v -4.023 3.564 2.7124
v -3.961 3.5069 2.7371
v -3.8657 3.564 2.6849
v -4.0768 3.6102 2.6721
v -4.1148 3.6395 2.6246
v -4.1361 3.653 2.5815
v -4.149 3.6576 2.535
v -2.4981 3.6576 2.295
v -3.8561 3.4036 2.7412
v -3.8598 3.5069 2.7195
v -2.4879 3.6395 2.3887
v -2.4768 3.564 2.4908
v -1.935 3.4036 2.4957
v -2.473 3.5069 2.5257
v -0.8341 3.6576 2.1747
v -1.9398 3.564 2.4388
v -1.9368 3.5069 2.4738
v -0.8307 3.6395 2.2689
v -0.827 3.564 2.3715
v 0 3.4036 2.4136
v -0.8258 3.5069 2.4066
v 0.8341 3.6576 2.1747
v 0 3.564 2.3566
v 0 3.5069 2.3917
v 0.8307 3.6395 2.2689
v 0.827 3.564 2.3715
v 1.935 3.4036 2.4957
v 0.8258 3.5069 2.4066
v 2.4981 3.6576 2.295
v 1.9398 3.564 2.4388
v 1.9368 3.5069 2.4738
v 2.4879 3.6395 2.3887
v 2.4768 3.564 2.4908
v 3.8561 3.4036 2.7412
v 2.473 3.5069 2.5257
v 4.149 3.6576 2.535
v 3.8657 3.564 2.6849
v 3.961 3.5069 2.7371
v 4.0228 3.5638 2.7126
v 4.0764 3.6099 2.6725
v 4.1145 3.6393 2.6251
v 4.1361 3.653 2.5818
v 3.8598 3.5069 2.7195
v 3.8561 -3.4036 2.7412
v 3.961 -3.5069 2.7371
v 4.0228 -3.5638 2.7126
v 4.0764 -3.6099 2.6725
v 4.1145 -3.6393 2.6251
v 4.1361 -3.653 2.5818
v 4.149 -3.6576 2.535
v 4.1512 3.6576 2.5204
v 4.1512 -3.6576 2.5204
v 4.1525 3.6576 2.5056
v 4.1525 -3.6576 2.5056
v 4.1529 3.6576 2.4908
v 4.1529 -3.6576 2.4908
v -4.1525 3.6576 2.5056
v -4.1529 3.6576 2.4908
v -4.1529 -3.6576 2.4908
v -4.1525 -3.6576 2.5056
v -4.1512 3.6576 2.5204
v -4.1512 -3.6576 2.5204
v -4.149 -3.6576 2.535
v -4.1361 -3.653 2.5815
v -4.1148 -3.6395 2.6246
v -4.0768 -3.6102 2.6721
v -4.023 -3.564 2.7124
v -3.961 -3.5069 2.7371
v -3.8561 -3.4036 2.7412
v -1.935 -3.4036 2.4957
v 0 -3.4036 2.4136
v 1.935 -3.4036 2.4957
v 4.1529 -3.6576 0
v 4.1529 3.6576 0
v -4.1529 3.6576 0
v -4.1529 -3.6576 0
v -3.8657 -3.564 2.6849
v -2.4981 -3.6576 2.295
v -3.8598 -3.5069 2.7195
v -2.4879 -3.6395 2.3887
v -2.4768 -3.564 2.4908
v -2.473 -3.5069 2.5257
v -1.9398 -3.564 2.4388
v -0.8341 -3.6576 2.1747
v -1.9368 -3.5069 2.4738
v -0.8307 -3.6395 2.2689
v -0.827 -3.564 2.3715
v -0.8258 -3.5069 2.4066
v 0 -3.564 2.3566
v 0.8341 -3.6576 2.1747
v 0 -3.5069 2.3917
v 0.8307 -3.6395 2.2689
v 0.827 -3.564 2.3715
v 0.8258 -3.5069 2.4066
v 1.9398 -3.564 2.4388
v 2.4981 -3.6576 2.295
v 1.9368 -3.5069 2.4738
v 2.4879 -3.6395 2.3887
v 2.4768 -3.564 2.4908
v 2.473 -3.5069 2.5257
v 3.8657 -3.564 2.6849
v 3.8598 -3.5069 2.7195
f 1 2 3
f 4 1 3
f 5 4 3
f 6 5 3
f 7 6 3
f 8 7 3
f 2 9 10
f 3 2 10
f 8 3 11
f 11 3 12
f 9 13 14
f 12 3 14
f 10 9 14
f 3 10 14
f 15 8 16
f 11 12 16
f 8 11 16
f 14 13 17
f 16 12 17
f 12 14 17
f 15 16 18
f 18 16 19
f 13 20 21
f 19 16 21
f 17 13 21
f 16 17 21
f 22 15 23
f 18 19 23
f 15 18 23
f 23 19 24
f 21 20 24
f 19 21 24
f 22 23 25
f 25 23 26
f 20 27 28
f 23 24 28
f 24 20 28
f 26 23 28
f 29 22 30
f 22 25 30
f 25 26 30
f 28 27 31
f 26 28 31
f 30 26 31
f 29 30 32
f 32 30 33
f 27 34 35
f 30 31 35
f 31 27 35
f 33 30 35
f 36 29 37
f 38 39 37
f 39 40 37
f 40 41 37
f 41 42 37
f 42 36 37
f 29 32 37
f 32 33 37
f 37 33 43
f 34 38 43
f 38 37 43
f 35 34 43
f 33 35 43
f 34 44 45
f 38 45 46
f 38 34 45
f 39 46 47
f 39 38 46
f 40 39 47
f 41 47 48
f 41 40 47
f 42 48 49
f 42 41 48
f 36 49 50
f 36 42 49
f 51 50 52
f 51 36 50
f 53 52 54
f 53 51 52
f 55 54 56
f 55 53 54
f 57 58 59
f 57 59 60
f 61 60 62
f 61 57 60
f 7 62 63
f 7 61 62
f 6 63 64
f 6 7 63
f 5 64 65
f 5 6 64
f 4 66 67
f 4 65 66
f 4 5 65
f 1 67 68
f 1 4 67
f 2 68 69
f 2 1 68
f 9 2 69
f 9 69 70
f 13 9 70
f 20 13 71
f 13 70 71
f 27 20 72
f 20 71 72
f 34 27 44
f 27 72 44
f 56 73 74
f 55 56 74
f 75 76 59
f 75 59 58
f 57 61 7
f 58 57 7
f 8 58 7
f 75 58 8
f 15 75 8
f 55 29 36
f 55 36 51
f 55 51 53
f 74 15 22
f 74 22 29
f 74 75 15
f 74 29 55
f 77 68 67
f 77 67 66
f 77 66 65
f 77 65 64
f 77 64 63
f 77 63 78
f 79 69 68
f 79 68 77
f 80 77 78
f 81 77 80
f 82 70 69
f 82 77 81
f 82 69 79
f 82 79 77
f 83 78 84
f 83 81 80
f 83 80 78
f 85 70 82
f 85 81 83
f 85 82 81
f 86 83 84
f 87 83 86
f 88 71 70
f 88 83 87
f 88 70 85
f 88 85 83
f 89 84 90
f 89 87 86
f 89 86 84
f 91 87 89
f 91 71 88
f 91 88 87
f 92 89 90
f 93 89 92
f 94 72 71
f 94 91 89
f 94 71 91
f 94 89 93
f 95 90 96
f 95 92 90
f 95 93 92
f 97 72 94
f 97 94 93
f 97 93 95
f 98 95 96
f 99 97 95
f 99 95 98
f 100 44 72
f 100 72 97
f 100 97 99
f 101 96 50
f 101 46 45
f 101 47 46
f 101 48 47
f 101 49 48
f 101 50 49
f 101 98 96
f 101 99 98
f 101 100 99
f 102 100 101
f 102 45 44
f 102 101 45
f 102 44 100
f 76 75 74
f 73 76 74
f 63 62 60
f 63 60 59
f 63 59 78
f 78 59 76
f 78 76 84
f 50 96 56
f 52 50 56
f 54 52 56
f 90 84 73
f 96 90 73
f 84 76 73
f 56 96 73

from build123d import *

# Parameters (mm, degrees)
SKETCH1_W      = 8.3058
SKETCH1_H      = 7.3152
KEY_DEPTH      = 2.794
EXTRUDE2_DEPTH = 8.3152
FILLET1_R      = 0.254


with BuildPart() as part:
    # Sketch1 → key (new body)
    with BuildSketch(Plane.XY):
        Rectangle(SKETCH1_W, SKETCH1_H)
    extrude(amount=KEY_DEPTH)

    # Sketch2 → Extrude2 (cut, through all)
    with BuildSketch(Plane.XZ.offset(3.6576)):
        with BuildLine():
            ThreePointArc((-4.1529, 2.794), (0, 2.413613466), (4.1529, 2.794))
            Line((4.1529, 2.794), (-4.1529, 2.794))
        make_face()
    extrude(amount=-EXTRUDE2_DEPTH, mode=Mode.SUBTRACT)

    # Fillet1
    fillet1_edges = [part.edges().sort_by_distance(p)[0] for p in [
        (4.1529, 0, 2.794),
        (0, 3.6576, 2.413613466),
        (0, -3.6576, 2.413613466),
        (-4.1529, 0, 2.794),
    ]]
    fillet(fillet1_edges, radius=FILLET1_R)


solid = part.part
